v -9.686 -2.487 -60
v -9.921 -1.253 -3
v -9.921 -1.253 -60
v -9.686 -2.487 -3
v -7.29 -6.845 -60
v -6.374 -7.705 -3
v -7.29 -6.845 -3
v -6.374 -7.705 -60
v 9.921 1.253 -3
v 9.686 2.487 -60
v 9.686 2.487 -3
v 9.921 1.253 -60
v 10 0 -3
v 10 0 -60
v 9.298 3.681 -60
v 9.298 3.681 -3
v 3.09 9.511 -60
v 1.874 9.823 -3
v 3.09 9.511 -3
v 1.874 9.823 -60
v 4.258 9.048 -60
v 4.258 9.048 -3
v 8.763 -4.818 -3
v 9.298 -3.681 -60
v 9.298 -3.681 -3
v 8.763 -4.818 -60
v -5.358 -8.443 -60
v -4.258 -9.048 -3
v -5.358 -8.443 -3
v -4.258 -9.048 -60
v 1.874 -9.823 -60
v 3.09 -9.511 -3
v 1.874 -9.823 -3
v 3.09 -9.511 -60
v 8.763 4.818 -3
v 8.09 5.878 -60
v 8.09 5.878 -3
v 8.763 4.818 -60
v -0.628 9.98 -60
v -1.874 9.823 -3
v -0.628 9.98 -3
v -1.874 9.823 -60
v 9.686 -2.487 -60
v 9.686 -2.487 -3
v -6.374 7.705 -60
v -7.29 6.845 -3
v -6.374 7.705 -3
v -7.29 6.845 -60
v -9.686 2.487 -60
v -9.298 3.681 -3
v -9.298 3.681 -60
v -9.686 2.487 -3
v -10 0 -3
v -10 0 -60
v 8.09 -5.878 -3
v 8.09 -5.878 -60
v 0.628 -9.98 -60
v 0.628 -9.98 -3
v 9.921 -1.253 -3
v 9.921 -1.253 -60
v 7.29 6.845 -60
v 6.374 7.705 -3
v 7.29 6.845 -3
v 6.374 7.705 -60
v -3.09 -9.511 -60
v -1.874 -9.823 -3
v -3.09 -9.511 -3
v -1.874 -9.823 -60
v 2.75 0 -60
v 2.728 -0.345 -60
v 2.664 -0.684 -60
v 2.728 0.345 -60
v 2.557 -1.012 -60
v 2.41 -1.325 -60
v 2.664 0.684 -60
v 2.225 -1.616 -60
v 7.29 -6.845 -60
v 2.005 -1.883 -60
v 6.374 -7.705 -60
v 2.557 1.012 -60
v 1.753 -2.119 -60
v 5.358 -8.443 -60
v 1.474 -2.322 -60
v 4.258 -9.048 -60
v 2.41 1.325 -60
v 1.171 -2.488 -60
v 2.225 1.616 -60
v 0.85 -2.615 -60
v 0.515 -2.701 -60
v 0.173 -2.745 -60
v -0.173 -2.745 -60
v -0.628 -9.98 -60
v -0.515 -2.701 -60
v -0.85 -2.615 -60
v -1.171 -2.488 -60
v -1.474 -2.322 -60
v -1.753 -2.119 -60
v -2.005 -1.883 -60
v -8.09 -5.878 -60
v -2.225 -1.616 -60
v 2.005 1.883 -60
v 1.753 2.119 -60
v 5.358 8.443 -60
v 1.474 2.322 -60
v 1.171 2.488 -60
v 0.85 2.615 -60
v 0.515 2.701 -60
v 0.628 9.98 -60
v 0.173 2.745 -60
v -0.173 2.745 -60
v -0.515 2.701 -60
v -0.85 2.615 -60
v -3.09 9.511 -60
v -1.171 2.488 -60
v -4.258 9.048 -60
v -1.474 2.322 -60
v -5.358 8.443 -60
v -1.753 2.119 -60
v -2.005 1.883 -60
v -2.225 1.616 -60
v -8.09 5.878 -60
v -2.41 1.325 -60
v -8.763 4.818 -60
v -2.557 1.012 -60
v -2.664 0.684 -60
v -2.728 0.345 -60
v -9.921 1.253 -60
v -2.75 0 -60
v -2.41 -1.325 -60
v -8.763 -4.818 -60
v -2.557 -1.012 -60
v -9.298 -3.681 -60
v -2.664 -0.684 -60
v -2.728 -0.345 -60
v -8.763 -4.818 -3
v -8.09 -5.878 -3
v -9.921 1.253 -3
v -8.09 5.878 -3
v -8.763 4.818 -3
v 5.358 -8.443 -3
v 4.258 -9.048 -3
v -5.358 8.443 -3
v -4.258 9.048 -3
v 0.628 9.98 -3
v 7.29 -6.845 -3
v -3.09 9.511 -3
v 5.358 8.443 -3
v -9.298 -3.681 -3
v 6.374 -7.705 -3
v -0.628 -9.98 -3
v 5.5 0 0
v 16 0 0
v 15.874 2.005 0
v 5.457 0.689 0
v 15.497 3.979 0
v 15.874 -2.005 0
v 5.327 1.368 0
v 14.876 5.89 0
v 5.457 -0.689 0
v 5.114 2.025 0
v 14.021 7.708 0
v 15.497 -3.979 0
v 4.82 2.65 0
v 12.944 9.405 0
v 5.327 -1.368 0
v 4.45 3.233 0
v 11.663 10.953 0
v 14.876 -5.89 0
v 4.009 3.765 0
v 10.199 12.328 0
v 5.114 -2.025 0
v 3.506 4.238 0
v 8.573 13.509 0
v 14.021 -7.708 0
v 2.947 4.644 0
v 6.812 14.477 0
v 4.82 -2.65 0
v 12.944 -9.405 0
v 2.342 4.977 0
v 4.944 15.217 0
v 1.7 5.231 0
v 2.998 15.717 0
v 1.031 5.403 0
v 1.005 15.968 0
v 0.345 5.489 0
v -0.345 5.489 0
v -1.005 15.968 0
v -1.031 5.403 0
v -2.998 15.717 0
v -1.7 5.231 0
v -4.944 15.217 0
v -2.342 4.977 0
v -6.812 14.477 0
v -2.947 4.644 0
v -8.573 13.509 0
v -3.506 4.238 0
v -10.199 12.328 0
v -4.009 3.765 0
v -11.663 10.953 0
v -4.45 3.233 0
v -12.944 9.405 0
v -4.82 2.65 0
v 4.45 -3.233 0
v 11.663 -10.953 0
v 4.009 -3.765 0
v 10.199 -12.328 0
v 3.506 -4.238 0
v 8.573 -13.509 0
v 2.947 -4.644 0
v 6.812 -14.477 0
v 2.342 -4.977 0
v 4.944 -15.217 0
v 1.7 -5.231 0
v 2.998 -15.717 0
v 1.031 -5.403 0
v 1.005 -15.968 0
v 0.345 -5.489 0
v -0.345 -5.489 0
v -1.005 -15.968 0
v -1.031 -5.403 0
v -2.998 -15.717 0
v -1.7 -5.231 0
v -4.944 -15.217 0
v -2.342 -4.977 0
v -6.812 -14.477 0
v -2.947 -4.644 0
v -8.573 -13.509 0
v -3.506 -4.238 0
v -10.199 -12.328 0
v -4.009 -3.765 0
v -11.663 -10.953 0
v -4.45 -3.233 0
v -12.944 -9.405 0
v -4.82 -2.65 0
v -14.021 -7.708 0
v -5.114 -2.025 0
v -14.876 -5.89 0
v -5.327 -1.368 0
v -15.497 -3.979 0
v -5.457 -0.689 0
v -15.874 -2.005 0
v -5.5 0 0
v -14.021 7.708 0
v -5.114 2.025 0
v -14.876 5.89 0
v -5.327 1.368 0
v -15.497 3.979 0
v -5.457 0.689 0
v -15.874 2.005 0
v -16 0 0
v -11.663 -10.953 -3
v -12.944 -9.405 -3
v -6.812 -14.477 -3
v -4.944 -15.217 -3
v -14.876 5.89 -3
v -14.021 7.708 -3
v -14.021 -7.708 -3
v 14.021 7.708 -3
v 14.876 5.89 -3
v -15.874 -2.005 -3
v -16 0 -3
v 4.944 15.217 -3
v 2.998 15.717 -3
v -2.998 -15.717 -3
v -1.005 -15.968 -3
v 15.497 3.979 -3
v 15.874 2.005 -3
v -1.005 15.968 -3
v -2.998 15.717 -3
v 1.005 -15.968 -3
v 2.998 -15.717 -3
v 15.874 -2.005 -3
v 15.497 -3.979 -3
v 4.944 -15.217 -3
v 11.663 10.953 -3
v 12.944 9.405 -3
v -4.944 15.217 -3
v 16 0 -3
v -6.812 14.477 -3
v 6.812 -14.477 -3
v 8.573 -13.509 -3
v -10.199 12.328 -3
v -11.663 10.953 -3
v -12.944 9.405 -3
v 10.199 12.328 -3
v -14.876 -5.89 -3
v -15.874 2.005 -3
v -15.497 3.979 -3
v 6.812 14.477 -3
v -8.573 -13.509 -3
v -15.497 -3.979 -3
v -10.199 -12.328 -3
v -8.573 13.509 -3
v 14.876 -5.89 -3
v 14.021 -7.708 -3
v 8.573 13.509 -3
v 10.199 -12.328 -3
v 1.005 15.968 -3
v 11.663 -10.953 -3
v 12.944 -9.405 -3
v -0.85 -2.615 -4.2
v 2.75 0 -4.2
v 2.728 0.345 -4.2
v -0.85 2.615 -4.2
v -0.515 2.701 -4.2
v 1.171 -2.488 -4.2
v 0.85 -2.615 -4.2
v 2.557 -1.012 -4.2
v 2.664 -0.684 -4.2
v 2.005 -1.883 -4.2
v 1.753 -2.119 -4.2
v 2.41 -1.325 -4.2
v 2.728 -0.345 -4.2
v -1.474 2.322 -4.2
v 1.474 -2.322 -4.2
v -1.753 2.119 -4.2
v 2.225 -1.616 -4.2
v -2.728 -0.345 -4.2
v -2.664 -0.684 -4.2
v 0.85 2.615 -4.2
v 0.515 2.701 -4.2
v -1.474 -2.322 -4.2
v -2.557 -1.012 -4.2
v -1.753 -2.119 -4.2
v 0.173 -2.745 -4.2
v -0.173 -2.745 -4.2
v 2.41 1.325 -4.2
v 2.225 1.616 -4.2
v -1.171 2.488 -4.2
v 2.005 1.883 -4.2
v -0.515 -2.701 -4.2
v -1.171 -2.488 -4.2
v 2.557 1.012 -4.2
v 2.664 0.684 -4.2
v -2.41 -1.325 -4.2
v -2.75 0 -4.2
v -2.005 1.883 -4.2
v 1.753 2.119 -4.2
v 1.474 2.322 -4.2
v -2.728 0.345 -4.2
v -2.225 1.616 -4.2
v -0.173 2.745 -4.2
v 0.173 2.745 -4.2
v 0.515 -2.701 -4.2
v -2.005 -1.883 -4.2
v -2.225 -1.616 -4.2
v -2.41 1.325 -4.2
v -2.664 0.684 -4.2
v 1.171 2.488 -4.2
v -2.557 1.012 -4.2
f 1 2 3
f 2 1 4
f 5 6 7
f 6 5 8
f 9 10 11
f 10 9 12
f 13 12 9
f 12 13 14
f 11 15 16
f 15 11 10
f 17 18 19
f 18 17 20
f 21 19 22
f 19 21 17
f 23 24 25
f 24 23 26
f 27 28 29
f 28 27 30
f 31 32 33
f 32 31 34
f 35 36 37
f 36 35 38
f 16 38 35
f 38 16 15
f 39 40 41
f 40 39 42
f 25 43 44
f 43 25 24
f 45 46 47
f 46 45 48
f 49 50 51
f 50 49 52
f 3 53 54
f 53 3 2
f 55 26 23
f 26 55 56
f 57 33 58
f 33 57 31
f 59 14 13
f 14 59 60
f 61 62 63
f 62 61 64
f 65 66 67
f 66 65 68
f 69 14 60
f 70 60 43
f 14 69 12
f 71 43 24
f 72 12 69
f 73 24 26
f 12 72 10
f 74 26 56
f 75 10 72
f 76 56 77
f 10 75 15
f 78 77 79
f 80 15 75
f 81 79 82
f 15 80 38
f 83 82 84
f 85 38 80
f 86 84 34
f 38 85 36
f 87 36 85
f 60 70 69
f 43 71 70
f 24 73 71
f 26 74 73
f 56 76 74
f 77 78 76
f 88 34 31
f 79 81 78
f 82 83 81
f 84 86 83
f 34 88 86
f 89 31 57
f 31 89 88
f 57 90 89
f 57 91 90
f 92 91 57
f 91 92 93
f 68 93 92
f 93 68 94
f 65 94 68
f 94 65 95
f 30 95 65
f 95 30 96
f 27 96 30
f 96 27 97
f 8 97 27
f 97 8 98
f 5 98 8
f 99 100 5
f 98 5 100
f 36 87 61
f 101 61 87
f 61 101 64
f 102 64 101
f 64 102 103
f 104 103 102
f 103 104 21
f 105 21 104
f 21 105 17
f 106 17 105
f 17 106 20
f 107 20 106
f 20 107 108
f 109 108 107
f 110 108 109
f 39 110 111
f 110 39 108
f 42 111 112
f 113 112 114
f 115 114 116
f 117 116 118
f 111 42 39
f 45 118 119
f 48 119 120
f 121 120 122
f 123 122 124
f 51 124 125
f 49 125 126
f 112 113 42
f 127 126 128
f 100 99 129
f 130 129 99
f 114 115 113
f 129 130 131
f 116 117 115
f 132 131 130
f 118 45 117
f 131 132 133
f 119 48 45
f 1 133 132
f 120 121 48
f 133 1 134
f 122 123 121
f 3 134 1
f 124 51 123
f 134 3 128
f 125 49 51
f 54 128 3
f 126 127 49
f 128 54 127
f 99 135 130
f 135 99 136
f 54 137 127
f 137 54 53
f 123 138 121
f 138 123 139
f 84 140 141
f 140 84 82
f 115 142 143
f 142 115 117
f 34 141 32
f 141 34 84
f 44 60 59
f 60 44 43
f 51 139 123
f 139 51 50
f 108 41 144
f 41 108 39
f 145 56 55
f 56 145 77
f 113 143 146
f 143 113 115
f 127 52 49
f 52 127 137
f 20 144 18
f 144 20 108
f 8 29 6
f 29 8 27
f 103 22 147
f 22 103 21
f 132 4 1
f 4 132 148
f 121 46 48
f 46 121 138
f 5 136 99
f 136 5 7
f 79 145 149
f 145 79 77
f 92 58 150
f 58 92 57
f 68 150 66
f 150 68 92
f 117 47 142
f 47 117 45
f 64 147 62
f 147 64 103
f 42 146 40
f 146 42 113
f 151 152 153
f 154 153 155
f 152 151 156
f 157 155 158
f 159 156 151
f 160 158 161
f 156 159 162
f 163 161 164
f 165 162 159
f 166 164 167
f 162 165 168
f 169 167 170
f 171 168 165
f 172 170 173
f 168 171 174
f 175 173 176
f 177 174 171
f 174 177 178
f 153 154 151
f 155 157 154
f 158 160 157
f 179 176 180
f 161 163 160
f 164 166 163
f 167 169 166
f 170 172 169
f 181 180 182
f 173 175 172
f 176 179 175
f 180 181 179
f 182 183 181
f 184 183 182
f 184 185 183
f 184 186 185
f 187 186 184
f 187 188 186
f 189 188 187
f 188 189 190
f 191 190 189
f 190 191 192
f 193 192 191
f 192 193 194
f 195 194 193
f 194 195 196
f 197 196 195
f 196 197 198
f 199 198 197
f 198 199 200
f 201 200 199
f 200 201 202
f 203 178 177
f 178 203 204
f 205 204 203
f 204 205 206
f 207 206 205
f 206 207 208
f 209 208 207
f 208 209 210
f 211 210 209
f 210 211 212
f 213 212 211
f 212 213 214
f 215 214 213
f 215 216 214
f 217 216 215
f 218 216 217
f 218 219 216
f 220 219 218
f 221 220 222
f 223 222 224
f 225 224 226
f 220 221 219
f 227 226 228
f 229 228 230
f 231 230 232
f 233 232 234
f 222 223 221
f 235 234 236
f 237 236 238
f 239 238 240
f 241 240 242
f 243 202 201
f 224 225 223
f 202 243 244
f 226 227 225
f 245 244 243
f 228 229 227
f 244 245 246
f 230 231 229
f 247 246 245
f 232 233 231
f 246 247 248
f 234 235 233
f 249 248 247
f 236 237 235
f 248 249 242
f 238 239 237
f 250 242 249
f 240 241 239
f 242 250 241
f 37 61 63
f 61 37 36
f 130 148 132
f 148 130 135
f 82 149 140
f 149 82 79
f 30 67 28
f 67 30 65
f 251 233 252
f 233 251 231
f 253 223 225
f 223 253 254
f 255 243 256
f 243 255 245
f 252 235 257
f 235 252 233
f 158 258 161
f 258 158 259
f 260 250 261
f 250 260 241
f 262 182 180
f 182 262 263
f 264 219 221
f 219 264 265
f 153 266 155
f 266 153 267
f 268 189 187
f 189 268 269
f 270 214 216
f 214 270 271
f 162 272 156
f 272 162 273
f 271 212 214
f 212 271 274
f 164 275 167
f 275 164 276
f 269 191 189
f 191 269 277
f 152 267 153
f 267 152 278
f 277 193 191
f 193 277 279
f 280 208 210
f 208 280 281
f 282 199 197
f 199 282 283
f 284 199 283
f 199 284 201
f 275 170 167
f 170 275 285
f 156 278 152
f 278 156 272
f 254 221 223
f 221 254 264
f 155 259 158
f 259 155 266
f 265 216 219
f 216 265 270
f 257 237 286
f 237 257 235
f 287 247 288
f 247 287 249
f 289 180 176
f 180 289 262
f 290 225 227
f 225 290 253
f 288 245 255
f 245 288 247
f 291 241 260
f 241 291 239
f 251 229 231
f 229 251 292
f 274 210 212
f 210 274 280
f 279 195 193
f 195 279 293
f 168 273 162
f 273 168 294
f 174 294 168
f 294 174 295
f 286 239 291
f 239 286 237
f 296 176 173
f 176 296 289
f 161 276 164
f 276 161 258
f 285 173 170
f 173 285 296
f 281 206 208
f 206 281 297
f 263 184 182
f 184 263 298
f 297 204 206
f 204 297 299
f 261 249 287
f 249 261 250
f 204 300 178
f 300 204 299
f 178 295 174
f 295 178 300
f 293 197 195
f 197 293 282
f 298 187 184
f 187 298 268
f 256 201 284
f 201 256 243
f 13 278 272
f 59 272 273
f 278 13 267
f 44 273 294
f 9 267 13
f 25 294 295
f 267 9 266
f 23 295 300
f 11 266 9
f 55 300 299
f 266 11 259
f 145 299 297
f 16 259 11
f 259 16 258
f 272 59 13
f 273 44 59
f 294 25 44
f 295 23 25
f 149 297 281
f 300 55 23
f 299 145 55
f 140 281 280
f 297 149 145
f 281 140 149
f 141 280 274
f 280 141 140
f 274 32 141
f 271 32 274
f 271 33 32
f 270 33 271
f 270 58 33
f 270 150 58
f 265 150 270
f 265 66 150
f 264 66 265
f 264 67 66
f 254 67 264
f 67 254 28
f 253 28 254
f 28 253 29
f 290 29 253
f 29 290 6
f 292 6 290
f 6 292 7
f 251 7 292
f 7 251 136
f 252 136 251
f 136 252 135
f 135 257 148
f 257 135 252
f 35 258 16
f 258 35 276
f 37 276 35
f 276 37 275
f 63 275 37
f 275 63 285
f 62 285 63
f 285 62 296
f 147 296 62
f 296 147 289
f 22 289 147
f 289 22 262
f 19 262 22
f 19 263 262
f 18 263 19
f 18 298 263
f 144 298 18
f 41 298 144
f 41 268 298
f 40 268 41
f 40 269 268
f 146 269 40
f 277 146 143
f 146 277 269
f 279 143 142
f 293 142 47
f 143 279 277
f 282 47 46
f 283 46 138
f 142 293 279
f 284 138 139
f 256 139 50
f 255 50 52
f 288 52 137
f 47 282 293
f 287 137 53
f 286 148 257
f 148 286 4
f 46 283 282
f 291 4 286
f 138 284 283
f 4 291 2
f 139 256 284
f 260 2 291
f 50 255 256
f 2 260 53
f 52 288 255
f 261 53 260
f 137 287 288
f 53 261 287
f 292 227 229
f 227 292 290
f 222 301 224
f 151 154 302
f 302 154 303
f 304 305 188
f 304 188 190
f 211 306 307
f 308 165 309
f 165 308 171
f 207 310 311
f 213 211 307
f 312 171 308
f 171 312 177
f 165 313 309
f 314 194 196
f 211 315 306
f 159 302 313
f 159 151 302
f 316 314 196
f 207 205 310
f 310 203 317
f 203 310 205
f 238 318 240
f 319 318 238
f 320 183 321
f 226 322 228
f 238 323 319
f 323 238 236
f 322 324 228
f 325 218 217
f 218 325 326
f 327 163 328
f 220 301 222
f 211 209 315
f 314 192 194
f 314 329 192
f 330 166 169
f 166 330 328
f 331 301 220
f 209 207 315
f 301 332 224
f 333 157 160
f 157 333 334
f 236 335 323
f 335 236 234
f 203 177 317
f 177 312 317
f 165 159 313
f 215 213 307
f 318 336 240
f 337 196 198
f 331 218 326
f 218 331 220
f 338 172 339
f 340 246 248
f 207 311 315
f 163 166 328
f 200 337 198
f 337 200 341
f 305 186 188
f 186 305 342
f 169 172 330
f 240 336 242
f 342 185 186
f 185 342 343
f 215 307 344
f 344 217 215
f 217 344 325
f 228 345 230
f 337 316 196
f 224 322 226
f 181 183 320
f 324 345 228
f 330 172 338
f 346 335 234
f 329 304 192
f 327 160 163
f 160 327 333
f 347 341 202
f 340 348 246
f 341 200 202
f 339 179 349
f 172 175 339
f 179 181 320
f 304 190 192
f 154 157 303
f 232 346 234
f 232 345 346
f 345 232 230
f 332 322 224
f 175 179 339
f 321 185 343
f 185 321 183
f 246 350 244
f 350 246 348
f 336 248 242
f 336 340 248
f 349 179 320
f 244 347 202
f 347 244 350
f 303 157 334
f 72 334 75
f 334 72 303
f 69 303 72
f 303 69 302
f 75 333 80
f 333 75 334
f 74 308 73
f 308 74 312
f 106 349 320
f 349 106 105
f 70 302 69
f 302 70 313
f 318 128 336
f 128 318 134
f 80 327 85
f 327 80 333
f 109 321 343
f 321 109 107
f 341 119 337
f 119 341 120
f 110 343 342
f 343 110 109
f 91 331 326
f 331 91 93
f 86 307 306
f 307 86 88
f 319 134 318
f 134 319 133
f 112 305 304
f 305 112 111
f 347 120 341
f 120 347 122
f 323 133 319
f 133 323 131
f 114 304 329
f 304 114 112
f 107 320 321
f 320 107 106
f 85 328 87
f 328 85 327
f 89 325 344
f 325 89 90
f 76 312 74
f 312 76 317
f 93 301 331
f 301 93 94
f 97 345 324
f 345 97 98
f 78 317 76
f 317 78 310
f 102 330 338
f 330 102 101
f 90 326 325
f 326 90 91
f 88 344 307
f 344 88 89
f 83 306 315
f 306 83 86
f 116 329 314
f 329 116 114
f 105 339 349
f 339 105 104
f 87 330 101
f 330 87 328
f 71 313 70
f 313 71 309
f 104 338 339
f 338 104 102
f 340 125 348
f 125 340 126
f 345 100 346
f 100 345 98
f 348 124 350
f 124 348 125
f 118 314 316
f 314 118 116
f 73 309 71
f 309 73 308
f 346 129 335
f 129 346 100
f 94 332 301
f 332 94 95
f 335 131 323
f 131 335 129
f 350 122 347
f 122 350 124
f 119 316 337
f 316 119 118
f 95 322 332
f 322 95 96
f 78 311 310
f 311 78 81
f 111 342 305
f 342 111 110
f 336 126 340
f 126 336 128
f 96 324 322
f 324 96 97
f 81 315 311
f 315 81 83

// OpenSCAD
$fn = 50;


difference() {
	union() {
		translate(v = [0, 0, -60.0000000000]) {
			cylinder(h = 60, r = 10.0000000000);
		}
		translate(v = [0, 0, -3.0000000000]) {
			cylinder(h = 3, r = 16.0000000000);
		}
	}
	union() {
		translate(v = [0, 0, 0]) {
			rotate(a = [0, 0, 0]) {
				difference() {
					union() {
						#translate(v = [0, 0, -60.0000000000]) {
							cylinder(h = 60, r = 2.2500000000);
						}
						#translate(v = [0, 0, -4.2000000000]) {
							cylinder(h = 4.2000000000, r = 10.0000000000, r1 = 2.7500000000, r2 = 5.5000000000);
						}
						#translate(v = [0, 0, -60.0000000000]) {
							cylinder(h = 60, r = 2.7500000000);
						}
						#translate(v = [0, 0, -60.0000000000]) {
							cylinder(h = 60, r = 2.2500000000);
						}
					}
					union();
				}
			}
		}
	}
}
